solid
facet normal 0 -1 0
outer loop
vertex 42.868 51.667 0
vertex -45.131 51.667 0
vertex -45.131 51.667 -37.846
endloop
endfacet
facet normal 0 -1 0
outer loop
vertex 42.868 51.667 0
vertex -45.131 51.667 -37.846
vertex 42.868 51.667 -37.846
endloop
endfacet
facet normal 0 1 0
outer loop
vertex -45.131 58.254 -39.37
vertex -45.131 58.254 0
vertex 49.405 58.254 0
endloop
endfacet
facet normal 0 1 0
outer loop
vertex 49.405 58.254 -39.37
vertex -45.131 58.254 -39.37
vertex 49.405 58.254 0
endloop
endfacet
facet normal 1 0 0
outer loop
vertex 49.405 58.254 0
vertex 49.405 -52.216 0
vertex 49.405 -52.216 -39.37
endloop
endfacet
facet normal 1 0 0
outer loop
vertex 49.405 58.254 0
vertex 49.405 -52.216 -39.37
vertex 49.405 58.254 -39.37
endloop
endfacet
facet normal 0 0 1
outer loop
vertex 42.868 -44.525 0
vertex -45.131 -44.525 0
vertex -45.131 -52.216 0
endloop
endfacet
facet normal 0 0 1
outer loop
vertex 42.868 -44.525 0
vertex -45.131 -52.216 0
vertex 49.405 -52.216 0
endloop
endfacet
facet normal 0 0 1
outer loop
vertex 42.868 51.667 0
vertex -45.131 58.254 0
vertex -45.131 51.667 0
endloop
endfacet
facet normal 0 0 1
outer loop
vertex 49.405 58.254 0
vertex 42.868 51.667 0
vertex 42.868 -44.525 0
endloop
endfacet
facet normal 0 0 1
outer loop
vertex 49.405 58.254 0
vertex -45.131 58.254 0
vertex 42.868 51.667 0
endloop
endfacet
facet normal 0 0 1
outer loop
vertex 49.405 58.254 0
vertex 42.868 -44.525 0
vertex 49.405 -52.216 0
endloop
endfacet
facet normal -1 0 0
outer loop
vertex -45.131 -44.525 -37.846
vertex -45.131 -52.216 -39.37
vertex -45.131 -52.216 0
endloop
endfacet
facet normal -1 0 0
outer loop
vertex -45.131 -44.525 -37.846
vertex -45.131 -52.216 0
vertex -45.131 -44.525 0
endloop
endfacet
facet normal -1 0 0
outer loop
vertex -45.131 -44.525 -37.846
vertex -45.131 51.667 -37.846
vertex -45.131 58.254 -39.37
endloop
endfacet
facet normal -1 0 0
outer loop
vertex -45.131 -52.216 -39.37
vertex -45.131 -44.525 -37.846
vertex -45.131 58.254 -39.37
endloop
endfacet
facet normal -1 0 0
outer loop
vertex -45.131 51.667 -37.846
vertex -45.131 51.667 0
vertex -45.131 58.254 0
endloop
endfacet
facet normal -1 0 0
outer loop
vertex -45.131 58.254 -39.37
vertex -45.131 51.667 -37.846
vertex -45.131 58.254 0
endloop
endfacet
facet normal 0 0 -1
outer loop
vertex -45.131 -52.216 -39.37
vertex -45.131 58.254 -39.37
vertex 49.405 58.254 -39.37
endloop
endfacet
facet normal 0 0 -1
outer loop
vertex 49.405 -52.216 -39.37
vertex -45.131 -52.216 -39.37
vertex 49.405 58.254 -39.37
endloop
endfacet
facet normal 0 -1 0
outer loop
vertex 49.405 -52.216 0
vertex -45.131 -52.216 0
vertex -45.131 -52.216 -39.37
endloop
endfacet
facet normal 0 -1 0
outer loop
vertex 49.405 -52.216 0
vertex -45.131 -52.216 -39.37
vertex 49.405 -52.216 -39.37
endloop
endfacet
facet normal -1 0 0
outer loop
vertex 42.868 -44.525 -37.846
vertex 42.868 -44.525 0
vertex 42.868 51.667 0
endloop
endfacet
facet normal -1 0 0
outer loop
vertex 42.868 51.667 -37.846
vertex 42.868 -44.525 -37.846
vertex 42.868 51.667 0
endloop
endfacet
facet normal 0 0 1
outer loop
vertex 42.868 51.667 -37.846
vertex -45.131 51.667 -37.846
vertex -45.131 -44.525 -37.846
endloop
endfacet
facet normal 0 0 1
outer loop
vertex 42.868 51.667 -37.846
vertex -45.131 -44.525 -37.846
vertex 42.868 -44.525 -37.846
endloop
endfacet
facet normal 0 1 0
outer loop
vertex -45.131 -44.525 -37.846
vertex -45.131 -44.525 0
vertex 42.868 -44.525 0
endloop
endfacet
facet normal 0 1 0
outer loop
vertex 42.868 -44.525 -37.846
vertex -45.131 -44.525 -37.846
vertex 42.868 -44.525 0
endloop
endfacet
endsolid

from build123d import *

# Parameters (mm, degrees)
F0_W     = 102.33476
F0_H     = 110.469941
F1_DEPTH = 39.37
F2_W     = 88.028256
F2_H     = 96.191108
F3_DEPTH = 37.846
F4_W     = 28.833367
F4_H     = 140.770766
F5_DEPTH = 58.166


with BuildPart() as f1:
    # F0 (on Top) → F1 (new body)
    with BuildSketch(Plane.XY):
        with Locations((-1.762386, 3.01904)):
            Rectangle(F0_W, F0_H)
    extrude(amount=-F1_DEPTH)

    # F2 (on face) → F3 (cut)
    with BuildSketch(Plane.XY):
        with Locations((-1.146434, 3.571052)):
            Rectangle(F2_W, F2_H)
    extrude(amount=-F3_DEPTH, mode=Mode.SUBTRACT)

    # F4 (on Top) → F5 (cut)
    with BuildSketch(Plane.XY):
        with Locations((-59.548001, 17.85939)):
            Rectangle(F4_W, F4_H)
    extrude(amount=-F5_DEPTH, mode=Mode.SUBTRACT)


solid = f1.part
